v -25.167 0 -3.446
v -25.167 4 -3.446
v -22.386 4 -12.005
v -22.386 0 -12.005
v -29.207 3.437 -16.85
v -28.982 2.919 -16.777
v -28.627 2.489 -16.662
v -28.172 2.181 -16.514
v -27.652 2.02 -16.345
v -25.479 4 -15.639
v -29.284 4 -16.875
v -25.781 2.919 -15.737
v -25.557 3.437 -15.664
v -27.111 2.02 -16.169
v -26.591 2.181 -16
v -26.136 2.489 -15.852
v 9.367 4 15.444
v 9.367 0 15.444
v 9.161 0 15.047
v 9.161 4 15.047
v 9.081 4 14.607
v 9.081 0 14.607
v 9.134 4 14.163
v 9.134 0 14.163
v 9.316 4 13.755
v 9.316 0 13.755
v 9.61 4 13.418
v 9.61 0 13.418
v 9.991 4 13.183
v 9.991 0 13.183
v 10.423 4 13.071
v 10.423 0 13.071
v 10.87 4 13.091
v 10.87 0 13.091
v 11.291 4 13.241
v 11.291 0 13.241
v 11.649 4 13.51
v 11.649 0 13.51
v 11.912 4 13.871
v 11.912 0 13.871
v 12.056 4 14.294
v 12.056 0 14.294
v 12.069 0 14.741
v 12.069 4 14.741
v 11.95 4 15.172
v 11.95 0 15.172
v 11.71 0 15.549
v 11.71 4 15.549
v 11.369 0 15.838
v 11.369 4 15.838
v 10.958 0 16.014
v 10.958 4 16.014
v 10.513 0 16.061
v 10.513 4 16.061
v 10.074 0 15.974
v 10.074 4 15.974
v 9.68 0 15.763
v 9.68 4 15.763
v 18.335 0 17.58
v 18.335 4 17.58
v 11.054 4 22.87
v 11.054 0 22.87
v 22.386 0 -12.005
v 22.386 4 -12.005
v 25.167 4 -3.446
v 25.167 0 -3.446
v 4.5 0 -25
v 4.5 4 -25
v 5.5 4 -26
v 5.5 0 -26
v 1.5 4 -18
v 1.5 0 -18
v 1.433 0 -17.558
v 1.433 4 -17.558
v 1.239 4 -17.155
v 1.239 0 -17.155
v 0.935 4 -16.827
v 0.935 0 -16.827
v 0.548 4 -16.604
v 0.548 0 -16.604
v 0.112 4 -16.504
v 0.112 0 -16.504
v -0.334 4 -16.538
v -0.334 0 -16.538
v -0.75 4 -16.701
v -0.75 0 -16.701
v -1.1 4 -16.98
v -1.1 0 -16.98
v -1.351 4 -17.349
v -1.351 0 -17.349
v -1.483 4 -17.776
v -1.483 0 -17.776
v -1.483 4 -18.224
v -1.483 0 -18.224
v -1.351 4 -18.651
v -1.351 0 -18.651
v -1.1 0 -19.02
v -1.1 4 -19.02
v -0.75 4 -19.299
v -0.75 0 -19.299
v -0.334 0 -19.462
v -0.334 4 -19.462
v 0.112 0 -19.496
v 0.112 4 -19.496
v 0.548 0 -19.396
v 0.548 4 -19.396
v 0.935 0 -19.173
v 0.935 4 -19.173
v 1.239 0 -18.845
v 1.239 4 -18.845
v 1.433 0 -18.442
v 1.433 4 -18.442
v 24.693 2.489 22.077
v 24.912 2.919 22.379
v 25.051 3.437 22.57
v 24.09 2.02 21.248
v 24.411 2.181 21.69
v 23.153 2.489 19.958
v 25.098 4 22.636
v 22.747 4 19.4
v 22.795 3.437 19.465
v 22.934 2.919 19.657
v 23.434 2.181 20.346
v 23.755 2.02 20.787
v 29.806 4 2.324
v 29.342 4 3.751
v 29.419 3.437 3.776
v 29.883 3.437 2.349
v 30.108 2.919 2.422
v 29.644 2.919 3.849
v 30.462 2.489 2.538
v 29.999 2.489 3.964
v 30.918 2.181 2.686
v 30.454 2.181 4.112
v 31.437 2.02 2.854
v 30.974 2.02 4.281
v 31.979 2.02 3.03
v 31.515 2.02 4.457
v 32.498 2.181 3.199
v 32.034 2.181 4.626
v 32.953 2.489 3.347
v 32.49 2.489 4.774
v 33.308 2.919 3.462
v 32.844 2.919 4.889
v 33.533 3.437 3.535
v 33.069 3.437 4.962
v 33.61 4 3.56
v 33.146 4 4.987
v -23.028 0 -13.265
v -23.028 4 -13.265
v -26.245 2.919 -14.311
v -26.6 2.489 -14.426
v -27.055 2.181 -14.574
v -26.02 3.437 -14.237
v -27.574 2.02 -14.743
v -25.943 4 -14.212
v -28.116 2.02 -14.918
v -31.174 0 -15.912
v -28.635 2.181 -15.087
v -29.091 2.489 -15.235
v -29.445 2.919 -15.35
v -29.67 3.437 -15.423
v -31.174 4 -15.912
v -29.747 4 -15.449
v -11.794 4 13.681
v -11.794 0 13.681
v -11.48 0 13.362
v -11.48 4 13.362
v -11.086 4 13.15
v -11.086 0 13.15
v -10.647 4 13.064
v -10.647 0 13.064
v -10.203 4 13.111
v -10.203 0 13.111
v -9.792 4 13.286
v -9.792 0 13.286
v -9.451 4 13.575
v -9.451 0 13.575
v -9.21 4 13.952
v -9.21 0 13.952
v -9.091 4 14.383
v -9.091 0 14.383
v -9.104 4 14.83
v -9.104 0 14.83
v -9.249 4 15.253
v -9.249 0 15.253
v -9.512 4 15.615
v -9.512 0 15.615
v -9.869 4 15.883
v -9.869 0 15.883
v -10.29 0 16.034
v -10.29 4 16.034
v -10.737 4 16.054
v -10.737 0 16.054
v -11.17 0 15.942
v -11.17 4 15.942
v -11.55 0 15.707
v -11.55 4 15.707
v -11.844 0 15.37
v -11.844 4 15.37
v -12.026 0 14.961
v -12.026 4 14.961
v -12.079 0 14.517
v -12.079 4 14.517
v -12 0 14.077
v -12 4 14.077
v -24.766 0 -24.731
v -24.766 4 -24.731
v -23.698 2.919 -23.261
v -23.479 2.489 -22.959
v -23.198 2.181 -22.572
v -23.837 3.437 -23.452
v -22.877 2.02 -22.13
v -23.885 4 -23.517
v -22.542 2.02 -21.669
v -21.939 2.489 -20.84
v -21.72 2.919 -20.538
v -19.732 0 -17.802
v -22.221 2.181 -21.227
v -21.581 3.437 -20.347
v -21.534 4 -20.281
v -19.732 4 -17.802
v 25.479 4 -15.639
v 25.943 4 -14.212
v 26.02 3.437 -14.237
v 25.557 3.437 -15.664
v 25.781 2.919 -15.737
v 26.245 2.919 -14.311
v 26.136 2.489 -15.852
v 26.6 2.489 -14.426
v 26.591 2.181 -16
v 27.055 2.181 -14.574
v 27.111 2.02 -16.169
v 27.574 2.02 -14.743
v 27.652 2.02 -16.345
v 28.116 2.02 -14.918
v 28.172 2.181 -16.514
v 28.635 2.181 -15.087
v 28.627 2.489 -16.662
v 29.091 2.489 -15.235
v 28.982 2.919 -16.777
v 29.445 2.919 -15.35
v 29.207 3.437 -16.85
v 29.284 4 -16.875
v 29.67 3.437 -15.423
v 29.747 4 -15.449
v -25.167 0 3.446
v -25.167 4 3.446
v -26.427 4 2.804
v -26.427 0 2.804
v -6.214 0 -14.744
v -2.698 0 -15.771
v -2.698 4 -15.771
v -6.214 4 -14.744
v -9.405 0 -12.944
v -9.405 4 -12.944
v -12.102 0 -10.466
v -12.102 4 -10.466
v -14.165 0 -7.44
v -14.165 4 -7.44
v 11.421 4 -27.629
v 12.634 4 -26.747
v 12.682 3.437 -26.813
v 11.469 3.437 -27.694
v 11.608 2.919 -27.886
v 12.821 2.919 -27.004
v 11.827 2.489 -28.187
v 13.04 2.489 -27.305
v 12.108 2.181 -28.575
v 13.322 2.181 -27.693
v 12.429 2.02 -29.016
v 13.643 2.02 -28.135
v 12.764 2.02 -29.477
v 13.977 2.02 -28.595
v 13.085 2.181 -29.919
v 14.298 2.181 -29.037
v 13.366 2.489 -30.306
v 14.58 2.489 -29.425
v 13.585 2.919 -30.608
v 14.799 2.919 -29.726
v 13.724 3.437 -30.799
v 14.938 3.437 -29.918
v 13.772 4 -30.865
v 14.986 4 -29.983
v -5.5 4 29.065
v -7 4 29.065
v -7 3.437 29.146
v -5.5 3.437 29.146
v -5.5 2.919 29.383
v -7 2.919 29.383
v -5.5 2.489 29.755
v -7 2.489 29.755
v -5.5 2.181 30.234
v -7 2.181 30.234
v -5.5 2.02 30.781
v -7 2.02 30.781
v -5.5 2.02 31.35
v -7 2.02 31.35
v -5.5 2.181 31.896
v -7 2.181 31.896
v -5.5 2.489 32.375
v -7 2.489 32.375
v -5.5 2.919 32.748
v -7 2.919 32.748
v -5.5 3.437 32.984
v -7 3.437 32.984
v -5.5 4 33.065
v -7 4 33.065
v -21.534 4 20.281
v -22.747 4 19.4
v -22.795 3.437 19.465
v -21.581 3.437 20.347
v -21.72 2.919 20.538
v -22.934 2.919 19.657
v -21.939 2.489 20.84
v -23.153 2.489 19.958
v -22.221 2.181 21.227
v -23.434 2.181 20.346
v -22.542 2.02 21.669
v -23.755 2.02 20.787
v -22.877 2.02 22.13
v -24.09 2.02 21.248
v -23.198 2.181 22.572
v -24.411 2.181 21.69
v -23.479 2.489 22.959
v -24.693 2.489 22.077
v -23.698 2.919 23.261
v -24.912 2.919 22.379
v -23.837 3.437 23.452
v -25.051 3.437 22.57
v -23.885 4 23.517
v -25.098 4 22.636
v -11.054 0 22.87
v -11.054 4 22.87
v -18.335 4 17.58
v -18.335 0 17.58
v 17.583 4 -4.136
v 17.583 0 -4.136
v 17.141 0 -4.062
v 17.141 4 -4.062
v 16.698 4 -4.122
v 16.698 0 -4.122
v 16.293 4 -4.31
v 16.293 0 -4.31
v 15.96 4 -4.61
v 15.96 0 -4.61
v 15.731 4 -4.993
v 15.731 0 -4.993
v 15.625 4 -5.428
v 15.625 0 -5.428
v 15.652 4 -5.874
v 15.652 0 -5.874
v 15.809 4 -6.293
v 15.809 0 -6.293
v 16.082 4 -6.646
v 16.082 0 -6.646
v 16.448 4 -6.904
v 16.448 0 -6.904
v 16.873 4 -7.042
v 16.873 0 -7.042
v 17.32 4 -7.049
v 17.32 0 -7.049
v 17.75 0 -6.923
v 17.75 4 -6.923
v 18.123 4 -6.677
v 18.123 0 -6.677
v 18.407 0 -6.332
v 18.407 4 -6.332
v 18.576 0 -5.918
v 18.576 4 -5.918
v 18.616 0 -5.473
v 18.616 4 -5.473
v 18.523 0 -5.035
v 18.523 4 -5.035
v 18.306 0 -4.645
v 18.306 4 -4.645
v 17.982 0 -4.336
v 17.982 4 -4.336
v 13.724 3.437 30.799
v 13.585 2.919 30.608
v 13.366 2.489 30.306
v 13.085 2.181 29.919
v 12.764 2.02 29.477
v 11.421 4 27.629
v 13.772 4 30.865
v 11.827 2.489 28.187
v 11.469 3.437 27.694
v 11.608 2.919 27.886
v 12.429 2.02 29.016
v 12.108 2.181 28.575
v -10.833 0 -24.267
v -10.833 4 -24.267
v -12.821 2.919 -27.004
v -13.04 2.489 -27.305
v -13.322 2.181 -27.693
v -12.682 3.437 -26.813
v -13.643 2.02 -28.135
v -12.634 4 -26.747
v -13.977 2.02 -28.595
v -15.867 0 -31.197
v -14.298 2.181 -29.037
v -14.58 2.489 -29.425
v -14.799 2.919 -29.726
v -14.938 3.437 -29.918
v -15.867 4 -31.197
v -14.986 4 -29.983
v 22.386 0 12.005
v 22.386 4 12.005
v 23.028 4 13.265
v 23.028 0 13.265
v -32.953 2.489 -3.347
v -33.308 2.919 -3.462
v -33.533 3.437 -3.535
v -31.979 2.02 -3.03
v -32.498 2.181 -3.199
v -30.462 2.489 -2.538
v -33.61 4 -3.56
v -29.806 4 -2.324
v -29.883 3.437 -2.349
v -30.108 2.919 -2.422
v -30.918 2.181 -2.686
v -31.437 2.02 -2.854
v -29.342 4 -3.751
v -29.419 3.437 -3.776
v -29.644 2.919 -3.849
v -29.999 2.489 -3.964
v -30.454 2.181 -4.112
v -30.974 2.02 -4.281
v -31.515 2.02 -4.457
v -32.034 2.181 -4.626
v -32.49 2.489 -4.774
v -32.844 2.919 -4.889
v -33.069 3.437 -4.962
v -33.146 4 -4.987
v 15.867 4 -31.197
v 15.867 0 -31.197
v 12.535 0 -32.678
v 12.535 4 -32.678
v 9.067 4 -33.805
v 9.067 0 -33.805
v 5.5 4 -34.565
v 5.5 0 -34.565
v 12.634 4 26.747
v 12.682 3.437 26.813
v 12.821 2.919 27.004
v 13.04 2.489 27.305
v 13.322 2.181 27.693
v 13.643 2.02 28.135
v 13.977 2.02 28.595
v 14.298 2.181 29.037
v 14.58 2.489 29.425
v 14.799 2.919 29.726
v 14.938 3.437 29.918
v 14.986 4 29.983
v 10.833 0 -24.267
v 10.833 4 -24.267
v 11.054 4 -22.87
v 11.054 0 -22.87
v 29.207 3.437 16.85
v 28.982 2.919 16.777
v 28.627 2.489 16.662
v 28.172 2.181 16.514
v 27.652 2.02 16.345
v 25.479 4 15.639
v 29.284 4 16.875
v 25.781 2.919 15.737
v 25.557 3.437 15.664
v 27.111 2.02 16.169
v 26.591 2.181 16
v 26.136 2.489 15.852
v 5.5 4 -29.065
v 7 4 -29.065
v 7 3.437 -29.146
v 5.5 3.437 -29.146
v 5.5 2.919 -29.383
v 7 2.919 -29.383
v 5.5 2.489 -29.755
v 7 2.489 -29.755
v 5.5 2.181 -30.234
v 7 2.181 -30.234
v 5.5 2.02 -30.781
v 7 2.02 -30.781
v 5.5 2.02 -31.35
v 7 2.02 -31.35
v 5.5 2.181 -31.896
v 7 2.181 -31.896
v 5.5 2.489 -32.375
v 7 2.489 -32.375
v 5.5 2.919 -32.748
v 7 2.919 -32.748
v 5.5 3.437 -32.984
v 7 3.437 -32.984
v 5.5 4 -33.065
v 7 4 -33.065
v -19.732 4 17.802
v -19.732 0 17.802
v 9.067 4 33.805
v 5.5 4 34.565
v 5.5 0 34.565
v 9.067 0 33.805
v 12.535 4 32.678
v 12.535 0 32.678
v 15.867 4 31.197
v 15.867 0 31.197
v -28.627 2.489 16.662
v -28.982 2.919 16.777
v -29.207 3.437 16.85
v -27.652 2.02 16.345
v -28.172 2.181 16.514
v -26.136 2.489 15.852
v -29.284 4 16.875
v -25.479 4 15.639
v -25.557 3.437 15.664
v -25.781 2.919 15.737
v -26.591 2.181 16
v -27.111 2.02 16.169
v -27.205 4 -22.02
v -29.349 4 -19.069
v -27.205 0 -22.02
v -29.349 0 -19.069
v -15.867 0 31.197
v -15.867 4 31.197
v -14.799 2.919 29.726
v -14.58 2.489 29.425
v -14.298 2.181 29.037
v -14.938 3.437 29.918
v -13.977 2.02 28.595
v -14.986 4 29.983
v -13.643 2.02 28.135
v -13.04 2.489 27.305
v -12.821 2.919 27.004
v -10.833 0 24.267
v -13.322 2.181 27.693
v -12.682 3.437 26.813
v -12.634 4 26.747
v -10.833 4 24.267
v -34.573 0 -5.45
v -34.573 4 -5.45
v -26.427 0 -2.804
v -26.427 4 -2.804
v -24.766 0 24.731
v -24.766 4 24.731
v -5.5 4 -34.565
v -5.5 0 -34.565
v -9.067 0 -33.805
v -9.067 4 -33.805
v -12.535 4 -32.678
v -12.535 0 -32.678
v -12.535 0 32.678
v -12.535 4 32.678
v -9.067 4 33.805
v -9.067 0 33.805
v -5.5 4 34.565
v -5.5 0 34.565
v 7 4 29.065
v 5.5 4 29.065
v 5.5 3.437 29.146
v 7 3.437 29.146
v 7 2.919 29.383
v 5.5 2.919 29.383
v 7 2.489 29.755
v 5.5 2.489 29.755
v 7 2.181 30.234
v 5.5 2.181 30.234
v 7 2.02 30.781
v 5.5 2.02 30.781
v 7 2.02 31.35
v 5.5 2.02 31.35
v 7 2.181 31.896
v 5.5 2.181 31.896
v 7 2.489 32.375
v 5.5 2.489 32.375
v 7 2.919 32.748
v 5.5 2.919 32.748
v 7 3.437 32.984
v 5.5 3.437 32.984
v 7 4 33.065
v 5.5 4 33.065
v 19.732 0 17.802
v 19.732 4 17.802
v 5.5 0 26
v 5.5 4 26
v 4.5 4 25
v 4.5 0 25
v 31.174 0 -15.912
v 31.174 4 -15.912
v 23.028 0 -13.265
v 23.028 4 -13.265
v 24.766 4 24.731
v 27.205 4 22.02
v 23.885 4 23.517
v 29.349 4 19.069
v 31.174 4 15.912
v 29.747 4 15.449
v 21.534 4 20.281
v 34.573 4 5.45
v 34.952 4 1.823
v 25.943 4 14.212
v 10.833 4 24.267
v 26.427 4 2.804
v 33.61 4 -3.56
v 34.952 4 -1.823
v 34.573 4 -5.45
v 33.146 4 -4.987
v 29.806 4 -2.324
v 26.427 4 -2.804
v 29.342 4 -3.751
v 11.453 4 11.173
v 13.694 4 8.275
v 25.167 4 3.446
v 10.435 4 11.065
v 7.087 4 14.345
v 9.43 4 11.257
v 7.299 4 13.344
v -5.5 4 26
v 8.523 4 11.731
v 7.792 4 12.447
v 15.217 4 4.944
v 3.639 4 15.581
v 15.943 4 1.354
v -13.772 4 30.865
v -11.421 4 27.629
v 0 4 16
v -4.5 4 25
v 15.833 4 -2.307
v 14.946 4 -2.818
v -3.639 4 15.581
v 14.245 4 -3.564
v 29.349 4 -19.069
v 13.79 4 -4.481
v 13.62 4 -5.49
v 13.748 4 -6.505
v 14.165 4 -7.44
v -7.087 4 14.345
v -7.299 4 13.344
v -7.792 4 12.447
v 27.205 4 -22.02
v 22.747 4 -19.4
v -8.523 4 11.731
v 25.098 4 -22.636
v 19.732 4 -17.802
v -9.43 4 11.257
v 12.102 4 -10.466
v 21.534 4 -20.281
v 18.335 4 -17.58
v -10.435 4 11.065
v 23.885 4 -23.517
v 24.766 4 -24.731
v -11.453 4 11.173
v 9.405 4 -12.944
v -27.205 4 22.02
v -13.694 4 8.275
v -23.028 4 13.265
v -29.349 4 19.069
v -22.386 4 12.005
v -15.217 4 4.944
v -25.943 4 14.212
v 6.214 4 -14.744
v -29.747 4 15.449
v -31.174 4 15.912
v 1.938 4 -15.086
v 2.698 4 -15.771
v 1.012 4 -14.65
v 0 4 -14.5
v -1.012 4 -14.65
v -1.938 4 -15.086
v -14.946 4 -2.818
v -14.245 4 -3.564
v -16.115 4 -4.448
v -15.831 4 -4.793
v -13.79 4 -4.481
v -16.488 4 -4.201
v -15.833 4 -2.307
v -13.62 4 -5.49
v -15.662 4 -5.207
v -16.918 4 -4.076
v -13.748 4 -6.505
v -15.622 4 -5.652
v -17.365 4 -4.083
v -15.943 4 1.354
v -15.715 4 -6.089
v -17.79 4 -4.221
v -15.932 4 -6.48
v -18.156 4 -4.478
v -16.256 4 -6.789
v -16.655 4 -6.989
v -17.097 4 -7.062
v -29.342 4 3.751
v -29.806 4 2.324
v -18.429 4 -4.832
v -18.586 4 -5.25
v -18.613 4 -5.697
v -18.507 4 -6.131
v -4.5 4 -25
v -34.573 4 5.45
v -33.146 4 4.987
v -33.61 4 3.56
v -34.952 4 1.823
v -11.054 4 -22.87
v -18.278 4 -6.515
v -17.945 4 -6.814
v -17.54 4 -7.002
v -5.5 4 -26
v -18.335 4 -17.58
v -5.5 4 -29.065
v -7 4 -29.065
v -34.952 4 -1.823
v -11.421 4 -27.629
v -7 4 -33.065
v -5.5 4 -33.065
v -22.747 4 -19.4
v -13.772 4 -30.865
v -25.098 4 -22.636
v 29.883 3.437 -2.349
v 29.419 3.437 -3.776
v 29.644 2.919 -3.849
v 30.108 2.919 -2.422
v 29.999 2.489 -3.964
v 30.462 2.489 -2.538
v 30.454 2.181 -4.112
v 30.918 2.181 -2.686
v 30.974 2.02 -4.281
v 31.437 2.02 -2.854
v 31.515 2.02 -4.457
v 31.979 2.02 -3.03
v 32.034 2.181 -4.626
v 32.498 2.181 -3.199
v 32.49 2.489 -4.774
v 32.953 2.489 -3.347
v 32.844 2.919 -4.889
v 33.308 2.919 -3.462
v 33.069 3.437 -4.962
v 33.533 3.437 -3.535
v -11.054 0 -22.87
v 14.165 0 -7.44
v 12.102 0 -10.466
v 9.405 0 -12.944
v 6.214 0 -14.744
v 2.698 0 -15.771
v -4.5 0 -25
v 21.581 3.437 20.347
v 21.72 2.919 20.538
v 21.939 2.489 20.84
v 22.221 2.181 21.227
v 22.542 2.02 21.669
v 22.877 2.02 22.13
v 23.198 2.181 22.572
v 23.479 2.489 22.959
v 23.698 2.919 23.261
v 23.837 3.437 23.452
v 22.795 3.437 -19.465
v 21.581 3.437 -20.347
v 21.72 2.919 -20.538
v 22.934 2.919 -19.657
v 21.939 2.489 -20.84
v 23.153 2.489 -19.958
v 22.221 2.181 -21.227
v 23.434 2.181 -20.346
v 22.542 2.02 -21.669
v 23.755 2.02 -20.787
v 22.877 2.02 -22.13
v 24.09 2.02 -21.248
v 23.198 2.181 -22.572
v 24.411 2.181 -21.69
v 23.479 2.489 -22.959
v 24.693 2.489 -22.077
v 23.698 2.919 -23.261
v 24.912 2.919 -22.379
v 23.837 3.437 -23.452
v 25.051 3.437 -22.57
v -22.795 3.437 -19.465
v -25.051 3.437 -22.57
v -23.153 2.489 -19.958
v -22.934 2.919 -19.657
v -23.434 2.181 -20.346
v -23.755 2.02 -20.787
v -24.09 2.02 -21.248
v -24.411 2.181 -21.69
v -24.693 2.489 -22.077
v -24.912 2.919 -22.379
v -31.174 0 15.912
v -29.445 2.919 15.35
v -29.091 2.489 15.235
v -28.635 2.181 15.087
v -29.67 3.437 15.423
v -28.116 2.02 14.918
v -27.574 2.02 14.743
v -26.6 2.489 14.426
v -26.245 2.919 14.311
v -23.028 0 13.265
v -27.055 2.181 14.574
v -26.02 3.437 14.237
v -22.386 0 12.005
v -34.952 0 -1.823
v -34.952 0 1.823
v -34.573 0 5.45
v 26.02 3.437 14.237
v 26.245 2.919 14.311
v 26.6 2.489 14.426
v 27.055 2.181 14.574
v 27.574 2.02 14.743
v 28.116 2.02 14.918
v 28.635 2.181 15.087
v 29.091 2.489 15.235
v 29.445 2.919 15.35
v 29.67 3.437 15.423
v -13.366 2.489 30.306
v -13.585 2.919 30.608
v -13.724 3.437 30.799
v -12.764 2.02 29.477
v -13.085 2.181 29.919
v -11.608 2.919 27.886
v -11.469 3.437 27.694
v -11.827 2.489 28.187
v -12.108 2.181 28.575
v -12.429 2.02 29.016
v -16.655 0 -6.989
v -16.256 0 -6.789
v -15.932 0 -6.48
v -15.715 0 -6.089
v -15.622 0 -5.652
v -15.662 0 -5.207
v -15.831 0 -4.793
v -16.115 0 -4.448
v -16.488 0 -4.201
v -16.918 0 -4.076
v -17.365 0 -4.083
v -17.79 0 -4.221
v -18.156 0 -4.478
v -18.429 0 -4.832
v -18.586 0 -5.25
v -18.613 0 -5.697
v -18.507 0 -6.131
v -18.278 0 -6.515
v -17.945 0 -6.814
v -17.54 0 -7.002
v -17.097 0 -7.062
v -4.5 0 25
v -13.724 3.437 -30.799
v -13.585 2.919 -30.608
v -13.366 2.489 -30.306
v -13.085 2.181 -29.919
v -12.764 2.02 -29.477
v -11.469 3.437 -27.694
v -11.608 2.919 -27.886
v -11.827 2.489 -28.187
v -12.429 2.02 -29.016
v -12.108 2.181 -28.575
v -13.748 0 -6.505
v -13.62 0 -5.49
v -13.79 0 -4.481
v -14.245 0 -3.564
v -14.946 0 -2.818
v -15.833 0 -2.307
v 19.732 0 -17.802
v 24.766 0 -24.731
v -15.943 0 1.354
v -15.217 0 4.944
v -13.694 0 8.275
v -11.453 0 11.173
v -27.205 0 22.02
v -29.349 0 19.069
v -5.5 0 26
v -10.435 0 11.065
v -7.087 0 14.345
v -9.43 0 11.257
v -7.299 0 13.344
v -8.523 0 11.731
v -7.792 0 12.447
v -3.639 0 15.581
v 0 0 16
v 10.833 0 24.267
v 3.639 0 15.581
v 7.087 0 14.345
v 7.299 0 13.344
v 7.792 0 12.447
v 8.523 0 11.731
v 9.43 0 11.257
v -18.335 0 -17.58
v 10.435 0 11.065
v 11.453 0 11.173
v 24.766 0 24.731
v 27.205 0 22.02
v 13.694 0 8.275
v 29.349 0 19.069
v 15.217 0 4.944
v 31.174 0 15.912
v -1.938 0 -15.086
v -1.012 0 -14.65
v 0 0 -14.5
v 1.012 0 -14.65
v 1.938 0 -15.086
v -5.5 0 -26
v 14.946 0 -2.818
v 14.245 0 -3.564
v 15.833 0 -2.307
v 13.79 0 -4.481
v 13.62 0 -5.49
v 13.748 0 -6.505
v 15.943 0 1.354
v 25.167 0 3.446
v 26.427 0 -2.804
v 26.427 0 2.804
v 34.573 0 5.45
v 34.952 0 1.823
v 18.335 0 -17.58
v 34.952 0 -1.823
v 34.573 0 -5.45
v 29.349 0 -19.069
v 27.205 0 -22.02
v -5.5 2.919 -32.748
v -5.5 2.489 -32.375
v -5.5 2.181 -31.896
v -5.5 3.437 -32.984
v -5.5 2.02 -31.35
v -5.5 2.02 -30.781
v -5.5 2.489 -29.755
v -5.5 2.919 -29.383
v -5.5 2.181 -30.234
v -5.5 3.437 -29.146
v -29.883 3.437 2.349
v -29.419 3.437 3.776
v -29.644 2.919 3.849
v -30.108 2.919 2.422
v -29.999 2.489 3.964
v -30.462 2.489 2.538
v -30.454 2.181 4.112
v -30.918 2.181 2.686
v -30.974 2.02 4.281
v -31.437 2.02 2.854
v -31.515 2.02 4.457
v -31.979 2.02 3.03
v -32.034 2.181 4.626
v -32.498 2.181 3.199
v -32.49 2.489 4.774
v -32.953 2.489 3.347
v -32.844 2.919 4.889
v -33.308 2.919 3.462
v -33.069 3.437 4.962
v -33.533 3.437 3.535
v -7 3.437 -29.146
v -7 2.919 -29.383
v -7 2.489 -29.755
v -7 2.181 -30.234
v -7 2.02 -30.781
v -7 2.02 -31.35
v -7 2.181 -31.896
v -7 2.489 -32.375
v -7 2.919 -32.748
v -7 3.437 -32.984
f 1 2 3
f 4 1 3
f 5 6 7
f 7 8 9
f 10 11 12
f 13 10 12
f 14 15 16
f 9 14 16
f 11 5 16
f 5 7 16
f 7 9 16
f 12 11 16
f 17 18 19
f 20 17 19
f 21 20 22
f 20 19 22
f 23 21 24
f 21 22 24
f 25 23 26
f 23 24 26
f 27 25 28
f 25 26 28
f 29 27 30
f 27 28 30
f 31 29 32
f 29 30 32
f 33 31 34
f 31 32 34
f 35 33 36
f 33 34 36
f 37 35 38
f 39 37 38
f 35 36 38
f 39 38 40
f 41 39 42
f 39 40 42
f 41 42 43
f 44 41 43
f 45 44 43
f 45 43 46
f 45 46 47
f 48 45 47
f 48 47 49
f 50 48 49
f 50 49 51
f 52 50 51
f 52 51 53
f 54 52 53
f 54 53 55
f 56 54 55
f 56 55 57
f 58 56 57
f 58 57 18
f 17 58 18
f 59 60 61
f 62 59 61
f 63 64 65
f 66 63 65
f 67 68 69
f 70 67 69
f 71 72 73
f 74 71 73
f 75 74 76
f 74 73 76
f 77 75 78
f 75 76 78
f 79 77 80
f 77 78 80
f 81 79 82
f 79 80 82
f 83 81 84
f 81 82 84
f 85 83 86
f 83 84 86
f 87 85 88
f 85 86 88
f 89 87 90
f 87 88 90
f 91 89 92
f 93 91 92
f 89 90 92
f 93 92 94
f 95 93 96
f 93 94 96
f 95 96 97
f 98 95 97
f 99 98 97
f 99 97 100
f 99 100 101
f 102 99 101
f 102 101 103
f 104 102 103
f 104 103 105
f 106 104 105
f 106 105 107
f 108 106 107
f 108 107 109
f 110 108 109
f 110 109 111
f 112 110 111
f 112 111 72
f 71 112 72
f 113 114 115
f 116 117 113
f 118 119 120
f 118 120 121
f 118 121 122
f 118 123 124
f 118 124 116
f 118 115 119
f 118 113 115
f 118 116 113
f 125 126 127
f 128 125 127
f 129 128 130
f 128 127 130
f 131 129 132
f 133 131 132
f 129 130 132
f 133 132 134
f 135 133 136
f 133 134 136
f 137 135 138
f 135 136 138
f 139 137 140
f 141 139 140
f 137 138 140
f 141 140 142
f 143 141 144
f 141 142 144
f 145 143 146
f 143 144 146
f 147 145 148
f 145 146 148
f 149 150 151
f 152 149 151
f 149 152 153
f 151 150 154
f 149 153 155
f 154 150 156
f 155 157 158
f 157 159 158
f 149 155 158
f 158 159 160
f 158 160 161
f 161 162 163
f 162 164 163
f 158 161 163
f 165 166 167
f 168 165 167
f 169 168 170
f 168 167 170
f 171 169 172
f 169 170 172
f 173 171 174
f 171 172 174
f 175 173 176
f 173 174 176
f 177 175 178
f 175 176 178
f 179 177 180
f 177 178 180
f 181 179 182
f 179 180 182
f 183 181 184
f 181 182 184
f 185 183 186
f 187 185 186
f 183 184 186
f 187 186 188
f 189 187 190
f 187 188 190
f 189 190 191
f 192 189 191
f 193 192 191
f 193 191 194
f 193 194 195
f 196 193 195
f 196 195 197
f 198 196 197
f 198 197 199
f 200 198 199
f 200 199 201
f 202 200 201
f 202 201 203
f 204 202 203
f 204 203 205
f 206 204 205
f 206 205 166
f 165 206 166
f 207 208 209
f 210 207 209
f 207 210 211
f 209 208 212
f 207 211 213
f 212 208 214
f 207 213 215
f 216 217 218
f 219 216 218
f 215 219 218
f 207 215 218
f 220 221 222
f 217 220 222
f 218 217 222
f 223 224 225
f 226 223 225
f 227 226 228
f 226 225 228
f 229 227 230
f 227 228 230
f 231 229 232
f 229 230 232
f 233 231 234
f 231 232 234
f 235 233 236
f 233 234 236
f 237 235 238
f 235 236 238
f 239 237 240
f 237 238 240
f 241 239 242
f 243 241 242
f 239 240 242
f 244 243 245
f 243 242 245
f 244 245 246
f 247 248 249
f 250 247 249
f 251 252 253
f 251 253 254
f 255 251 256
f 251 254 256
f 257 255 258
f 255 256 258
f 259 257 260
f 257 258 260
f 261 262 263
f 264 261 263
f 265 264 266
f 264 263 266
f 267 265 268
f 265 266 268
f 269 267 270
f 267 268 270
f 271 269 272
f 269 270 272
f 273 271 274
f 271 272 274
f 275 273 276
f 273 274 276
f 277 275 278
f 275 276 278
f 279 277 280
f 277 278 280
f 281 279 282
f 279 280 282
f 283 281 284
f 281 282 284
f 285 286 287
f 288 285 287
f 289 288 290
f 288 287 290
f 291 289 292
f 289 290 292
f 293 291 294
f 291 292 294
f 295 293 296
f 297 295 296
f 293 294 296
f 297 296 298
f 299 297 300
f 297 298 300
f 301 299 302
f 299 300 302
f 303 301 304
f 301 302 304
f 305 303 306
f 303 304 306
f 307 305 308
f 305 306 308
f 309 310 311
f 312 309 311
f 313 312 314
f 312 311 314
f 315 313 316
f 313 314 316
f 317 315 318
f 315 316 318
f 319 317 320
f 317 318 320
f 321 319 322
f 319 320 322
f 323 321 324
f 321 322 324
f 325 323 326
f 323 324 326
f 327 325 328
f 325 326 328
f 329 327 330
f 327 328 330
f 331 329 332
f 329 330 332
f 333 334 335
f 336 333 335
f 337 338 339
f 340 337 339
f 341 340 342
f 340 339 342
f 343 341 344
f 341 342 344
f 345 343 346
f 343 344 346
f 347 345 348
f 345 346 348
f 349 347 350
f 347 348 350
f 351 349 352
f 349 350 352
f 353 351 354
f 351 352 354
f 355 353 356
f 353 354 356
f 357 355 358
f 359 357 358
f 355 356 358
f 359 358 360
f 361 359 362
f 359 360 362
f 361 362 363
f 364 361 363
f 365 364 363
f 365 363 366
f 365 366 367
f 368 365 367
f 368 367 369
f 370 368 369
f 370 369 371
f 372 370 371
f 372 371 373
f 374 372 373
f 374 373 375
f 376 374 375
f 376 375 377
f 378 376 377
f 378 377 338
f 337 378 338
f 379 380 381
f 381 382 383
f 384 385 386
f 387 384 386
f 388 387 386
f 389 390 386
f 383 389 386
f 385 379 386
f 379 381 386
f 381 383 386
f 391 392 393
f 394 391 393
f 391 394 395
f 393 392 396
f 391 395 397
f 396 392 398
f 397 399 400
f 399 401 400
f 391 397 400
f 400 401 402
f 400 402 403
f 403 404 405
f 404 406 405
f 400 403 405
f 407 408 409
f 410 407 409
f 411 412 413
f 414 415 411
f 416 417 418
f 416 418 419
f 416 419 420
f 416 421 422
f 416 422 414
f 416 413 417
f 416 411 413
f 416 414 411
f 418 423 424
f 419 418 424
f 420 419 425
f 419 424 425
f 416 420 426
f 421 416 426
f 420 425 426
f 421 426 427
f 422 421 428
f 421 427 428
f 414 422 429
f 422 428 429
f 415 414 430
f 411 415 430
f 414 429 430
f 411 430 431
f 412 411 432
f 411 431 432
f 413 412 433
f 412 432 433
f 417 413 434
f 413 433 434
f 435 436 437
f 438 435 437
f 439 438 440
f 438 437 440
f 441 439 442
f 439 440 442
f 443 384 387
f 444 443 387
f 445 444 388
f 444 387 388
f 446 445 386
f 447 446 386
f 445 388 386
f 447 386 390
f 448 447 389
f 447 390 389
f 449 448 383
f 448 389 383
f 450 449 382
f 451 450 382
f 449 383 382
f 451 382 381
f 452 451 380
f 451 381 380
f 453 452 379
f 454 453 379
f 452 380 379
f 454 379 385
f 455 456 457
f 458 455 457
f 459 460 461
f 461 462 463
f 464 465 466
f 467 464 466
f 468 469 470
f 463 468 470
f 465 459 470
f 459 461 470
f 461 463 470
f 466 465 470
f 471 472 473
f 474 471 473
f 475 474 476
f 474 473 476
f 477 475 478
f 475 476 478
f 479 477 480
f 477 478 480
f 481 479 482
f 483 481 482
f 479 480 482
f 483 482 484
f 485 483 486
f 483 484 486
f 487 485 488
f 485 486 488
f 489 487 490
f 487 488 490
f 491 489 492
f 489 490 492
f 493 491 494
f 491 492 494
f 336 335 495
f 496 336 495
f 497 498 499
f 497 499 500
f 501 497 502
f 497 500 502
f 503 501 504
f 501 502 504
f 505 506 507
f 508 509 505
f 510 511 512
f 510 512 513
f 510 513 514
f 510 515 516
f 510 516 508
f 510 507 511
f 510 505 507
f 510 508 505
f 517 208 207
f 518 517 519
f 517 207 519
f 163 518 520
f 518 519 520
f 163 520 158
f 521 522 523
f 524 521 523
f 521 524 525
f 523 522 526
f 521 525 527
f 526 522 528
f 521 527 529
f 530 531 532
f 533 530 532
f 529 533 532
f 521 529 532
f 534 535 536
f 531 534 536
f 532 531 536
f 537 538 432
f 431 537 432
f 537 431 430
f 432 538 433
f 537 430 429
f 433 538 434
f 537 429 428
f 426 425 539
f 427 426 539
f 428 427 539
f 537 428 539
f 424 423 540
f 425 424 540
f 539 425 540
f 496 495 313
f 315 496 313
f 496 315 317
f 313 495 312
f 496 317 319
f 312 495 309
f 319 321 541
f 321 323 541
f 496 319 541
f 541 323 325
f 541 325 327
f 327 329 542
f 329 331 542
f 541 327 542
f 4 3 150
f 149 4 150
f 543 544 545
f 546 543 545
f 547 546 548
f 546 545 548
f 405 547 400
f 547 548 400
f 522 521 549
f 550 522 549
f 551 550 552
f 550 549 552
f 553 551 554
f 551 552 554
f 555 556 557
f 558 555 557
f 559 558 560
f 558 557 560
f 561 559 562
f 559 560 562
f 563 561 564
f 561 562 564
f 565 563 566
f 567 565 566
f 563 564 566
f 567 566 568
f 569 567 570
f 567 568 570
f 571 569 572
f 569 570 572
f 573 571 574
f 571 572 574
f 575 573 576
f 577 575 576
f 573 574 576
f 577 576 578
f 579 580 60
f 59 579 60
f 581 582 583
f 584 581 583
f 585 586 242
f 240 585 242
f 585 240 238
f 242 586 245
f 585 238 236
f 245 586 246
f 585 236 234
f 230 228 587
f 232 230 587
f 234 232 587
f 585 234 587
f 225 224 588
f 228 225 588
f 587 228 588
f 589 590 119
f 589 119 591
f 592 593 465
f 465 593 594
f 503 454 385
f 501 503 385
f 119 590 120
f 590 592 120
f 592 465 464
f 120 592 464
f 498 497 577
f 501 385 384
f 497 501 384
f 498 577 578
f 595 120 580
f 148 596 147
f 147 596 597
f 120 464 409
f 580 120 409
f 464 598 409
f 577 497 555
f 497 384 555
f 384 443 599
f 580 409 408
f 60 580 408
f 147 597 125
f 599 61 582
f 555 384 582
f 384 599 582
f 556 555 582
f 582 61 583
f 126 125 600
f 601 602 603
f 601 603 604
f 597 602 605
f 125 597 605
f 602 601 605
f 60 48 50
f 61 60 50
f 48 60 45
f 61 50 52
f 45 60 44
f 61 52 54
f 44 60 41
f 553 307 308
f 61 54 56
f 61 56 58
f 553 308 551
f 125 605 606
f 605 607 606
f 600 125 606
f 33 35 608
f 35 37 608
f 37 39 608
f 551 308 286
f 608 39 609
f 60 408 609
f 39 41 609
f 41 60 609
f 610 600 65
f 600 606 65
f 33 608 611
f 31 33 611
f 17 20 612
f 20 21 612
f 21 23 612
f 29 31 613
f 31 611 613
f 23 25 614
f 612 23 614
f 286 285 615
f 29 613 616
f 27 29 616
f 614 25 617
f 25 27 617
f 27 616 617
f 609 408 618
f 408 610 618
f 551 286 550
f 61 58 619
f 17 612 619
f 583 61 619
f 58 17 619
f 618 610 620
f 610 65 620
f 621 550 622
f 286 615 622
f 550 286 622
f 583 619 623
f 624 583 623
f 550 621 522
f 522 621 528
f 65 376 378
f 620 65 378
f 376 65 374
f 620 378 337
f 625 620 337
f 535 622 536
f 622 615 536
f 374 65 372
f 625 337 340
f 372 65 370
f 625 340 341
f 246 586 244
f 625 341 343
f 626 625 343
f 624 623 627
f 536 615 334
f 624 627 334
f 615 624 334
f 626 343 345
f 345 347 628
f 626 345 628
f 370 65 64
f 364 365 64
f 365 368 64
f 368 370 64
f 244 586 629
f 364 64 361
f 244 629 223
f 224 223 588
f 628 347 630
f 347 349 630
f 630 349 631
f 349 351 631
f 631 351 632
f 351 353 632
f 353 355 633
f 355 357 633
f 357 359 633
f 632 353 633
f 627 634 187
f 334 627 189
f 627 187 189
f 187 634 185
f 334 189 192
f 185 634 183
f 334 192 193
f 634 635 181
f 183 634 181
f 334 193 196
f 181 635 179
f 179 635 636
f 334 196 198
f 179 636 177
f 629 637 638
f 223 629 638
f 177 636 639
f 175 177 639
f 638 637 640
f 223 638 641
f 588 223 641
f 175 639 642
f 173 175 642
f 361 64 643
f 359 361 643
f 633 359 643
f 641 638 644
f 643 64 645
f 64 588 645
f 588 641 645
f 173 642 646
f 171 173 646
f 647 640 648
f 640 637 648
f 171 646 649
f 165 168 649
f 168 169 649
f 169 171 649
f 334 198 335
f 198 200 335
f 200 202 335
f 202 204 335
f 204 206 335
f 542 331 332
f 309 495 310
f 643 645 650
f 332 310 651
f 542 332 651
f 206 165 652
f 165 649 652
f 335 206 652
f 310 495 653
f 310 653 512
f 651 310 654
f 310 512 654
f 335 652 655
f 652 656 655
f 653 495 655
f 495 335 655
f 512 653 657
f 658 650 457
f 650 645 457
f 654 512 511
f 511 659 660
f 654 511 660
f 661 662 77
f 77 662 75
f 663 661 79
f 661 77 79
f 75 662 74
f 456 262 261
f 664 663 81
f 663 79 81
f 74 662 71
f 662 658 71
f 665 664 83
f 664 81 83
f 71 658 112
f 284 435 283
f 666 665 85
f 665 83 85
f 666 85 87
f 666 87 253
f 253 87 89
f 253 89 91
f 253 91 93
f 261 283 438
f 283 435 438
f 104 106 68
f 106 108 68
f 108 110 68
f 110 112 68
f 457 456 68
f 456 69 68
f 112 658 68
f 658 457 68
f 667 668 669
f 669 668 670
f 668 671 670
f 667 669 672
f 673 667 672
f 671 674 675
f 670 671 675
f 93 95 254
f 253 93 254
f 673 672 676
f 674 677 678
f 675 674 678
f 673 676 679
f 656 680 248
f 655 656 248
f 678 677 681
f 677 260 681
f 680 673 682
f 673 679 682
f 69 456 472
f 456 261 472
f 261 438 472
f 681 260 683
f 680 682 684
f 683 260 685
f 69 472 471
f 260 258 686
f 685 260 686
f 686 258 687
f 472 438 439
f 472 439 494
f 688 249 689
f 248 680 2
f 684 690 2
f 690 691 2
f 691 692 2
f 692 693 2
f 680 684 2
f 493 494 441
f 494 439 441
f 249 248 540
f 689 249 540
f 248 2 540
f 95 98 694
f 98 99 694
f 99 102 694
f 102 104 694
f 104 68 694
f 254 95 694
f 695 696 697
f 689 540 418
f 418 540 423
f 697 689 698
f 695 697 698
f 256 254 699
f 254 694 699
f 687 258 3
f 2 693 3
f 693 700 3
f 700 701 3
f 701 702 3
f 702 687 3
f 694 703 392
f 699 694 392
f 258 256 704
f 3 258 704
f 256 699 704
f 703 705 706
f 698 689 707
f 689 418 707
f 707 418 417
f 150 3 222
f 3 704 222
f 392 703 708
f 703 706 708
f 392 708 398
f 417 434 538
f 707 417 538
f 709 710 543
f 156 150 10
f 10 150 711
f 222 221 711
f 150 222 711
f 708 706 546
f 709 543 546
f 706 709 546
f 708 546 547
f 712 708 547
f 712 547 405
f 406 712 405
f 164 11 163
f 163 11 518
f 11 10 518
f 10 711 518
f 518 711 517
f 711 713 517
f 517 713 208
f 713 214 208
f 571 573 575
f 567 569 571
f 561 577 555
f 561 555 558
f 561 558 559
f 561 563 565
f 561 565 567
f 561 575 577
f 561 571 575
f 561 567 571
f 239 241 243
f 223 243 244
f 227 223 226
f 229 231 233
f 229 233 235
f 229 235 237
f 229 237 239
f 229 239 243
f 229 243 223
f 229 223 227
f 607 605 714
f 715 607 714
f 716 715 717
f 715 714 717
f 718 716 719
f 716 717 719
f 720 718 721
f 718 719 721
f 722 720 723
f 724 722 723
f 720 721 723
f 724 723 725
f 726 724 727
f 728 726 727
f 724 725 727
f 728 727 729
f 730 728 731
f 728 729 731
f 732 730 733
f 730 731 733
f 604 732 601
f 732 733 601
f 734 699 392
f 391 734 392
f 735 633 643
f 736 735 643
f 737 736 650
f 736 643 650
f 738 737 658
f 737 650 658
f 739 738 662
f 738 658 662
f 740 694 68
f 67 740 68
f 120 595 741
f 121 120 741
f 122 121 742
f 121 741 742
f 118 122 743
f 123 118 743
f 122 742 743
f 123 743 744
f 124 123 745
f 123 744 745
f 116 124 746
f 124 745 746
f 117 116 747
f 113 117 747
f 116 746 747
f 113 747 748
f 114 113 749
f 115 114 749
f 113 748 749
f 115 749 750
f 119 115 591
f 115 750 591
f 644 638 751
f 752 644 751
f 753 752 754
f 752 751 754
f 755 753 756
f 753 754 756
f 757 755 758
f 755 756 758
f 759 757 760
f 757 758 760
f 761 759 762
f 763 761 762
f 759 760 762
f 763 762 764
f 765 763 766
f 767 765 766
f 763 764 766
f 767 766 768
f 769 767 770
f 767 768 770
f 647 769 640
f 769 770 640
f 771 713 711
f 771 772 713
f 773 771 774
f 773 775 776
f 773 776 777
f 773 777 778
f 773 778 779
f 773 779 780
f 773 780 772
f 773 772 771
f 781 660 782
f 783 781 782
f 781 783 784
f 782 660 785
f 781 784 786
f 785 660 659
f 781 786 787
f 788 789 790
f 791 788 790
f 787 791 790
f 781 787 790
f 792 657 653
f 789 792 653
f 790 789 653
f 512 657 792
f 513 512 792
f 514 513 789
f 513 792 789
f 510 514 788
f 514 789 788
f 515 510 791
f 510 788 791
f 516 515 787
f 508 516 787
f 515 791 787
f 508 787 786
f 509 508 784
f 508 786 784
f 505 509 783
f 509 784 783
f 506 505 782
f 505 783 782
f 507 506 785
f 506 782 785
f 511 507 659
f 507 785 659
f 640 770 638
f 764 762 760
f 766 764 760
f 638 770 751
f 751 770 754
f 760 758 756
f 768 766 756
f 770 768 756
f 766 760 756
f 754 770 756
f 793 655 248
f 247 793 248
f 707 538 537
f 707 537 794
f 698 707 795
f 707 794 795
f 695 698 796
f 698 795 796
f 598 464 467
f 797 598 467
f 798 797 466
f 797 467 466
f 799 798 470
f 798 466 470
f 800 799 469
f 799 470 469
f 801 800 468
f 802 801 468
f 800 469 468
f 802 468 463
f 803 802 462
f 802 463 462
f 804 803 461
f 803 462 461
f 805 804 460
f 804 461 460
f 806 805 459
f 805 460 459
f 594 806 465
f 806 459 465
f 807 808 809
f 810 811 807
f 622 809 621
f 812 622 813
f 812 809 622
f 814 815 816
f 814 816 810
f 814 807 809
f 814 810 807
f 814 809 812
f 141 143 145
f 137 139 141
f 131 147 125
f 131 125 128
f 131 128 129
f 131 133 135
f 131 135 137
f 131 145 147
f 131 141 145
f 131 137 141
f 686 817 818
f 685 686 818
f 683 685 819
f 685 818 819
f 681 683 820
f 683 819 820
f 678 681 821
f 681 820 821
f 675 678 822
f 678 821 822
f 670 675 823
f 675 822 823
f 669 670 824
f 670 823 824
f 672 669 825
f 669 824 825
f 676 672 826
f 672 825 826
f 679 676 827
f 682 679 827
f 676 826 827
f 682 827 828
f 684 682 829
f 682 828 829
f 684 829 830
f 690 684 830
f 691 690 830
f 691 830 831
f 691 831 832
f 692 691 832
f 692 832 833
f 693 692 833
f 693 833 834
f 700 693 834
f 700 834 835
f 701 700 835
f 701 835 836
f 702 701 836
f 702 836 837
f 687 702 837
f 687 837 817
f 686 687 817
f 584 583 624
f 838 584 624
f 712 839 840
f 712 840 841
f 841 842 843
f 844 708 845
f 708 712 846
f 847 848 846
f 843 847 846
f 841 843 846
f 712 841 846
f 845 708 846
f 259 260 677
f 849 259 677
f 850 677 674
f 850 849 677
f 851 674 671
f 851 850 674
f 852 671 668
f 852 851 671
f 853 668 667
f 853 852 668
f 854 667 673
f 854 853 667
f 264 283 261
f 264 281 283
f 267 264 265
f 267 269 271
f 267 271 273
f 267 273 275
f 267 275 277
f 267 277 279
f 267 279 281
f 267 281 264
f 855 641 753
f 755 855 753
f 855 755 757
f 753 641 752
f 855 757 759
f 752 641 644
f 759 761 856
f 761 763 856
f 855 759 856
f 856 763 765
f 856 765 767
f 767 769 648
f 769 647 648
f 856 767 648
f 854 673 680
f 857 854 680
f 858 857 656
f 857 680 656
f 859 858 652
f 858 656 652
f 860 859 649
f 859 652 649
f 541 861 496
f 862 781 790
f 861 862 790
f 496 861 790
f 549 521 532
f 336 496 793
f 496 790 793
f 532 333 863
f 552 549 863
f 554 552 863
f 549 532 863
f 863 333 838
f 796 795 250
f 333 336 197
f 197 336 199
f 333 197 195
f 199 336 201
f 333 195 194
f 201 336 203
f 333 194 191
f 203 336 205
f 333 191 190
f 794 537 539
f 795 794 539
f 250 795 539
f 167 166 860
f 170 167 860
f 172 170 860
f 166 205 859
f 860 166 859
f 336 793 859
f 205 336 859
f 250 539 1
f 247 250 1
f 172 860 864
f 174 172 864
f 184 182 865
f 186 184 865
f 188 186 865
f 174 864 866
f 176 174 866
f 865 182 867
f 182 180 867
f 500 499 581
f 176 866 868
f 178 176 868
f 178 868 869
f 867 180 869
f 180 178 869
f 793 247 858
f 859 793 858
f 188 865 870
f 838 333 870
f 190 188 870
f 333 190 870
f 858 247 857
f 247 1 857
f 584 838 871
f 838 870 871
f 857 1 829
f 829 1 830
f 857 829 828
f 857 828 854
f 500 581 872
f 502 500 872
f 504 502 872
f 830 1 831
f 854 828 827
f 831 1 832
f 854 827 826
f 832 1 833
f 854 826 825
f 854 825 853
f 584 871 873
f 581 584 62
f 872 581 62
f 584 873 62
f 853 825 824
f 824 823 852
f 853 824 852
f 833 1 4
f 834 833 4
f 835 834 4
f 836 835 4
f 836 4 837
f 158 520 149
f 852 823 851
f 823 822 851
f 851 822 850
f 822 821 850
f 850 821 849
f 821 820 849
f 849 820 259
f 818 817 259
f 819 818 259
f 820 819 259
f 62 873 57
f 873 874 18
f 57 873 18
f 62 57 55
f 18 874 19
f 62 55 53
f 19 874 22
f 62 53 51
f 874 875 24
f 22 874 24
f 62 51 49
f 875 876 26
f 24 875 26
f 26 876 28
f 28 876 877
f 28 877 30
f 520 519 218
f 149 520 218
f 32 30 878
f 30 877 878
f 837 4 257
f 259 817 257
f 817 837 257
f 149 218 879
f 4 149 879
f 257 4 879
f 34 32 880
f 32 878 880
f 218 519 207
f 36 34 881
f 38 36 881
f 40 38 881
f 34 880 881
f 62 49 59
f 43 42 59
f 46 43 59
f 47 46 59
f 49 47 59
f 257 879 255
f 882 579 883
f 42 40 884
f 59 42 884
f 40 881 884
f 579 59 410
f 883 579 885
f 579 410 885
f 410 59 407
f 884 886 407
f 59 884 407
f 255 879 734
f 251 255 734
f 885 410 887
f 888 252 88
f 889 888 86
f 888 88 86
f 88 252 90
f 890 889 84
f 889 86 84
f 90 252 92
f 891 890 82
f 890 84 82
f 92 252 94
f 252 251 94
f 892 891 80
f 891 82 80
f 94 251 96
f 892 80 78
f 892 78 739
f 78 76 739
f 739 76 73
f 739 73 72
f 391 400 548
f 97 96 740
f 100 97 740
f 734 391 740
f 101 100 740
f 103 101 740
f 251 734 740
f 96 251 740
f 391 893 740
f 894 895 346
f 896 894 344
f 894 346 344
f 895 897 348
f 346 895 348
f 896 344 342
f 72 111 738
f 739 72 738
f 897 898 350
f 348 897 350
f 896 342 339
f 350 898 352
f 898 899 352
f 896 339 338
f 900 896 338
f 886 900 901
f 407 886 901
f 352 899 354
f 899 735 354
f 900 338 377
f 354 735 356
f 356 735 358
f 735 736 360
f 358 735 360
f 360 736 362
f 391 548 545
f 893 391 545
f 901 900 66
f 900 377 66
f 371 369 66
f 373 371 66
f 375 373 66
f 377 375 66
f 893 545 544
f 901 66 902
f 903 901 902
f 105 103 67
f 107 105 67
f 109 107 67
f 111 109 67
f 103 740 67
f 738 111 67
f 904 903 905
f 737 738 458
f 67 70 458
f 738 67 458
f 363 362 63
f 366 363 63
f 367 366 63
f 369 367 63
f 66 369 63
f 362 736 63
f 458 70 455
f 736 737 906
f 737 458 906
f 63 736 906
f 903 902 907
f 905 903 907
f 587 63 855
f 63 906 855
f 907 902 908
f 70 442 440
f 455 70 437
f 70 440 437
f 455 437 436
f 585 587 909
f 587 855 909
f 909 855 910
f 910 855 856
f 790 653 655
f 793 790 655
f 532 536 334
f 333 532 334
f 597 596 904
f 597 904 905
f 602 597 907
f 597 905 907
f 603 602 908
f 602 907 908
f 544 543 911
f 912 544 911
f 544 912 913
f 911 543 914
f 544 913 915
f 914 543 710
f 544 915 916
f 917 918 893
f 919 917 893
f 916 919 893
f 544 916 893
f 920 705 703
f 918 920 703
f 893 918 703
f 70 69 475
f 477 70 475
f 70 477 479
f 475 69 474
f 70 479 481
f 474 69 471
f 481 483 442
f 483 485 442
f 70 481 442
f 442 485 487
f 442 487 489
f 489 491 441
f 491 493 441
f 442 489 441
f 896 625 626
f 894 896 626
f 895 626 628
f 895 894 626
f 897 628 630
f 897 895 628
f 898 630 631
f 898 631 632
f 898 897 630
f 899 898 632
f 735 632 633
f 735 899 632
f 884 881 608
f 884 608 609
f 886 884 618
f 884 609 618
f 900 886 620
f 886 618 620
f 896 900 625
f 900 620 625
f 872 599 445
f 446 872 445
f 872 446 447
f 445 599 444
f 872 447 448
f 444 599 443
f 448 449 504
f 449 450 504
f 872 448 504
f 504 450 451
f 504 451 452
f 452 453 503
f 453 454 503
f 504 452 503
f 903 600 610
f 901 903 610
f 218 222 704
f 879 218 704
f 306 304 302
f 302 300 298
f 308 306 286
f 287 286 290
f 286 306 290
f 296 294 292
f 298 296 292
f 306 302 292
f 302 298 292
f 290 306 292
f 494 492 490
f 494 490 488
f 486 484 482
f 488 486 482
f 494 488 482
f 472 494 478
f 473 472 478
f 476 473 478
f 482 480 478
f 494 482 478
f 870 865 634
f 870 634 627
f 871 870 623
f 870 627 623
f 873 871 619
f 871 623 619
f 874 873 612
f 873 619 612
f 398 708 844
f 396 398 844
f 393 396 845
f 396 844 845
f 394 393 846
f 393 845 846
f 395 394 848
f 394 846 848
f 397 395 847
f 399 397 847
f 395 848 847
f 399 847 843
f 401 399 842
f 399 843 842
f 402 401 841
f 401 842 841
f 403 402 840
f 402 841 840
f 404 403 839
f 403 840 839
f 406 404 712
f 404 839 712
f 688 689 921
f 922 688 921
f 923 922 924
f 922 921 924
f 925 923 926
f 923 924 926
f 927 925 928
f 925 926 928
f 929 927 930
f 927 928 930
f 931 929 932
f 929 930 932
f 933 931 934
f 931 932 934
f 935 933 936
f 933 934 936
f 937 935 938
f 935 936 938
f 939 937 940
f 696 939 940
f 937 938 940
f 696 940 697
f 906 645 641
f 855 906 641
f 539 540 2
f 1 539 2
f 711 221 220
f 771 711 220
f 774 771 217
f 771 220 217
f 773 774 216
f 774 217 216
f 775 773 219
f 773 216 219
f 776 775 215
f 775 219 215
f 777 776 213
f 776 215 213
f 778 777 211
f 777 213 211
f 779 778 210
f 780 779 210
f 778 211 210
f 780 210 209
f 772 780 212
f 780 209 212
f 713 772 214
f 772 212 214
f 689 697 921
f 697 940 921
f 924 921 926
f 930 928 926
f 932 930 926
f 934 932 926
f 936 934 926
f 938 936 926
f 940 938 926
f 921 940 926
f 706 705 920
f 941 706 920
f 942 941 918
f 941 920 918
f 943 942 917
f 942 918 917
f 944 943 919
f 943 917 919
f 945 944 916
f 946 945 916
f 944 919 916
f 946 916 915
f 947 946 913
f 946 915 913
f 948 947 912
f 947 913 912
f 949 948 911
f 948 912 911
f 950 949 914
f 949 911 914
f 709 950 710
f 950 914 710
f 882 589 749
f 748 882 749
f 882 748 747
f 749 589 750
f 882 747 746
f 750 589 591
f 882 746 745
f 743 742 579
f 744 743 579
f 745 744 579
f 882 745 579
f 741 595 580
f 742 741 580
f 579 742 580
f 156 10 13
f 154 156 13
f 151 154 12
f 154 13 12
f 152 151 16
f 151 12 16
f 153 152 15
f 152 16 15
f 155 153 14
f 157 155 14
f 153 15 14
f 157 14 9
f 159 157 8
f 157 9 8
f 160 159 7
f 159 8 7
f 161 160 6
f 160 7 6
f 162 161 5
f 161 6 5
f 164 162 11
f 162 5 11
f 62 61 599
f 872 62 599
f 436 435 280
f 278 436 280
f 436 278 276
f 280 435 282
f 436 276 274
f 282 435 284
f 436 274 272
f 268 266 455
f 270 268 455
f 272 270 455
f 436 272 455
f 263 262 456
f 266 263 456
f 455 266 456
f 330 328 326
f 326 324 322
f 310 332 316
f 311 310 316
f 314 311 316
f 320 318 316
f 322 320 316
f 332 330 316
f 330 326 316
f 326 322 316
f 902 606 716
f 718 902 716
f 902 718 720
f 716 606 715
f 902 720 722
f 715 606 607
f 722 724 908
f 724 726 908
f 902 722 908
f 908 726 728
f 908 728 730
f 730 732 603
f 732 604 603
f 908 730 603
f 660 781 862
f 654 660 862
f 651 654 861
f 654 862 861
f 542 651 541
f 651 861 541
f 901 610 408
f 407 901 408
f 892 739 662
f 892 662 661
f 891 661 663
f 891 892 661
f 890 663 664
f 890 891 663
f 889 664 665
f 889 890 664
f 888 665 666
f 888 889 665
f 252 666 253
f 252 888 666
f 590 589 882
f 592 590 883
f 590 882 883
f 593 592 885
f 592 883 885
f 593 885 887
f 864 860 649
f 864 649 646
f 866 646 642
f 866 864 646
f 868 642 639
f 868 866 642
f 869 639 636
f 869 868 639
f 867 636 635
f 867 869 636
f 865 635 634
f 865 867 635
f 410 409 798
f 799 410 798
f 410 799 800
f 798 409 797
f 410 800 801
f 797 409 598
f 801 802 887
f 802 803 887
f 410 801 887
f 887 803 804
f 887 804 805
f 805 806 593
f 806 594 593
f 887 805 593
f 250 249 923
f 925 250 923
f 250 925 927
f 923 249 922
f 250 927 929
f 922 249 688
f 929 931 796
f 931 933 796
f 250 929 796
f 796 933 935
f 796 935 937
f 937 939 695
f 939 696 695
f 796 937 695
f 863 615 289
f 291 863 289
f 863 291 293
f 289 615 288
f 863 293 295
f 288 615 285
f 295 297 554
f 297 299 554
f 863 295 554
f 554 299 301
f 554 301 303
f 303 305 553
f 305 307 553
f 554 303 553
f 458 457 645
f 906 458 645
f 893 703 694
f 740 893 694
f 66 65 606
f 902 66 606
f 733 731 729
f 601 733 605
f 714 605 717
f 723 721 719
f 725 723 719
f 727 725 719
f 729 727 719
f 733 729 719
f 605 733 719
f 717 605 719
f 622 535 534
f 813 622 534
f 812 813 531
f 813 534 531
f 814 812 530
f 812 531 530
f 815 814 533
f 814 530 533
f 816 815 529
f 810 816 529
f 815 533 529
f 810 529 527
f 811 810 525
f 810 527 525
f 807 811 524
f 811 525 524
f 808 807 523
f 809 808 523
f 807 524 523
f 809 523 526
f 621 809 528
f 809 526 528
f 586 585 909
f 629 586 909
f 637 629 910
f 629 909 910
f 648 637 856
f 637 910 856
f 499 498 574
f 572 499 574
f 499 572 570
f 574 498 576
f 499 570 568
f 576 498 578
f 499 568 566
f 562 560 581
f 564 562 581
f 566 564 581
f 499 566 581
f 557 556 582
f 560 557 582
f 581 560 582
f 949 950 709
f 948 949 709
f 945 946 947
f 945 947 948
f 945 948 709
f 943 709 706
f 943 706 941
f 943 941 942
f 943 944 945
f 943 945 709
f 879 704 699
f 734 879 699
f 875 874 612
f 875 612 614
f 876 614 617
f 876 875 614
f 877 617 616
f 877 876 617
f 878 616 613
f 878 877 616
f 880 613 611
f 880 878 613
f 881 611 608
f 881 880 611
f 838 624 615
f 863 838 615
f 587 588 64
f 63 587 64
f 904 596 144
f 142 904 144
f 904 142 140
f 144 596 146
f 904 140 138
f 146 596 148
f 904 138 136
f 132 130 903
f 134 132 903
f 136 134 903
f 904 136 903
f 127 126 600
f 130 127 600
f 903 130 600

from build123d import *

# Parameters (mm, degrees)
SKIZZE1_R                       = 35
AUFSATZ_LINEAR_AUSTRAGEN1_DEPTH = 4
SCHNITT_LINEAR_AUSTRAGEN1_DEPTH = 5
SKIZZE4_W                       = 14
SKIZZE4_H                       = 2
KREISMUSTER1_COUNT              = 10
SKIZZE5_R                       = 16
SCHNITT_LINEAR_AUSTRAGEN2_DEPTH = 5
SKIZZE7_R                       = 3.5
AUFSATZ_LINEAR_AUSTRAGEN2_DEPTH = 4
SKIZZE6_R                       = 1.5
SCHNITT_LINEAR_AUSTRAGEN3_DEPTH = 5
KREISMUSTER2_COUNT              = 5


with BuildPart() as part:
    # Skizze1 → Aufsatz-Linear austragen1 (new body)
    with BuildSketch(Plane(origin=(0, 0, 0), x_dir=(1, 0, 0), z_dir=(0, 1, 0))):
        Circle(SKIZZE1_R)
    extrude(amount=AUFSATZ_LINEAR_AUSTRAGEN1_DEPTH)

    # Skizze2 → Schnitt-Linear austragen1 (cut, through all)
    with BuildSketch(Plane(origin=(0, 4, 0), x_dir=(1, 0, 0), z_dir=(0, 1, 0))):
        Polygon((-5.5, 37), (-5.5, 26), (-4.5, 25), (0, 25), (4.5, 25), (5.5, 26), (5.5, 37), align=None)
    schnitt_linear_austragen1 = extrude(amount=-SCHNITT_LINEAR_AUSTRAGEN1_DEPTH, mode=Mode.SUBTRACT)

    # Skizze4 → Schnitt-Rotation1 (revolve, cut)
    with BuildSketch(Plane(origin=(0, 4, 0), x_dir=(1, 0, 0), z_dir=(0, 1, 0))):
        with Locations((0, 30.065155865)):
            Rectangle(SKIZZE4_W, SKIZZE4_H)
    schnitt_rotation1 = revolve(axis=Axis((-7, 4, -31.065155865), (1, 0, 0)), mode=Mode.SUBTRACT)

    # Kreismuster1: Schnitt-Linear austragen1, Schnitt-Rotation1 ×10 about axis
    kreismuster1_axis = Axis((0, 0, 0), (0, 1, 0))
    for i in range(1, KREISMUSTER1_COUNT):
        add(schnitt_linear_austragen1.rotate(kreismuster1_axis, i * 360 / KREISMUSTER1_COUNT), mode=Mode.SUBTRACT)
        add(schnitt_rotation1.rotate(kreismuster1_axis, i * 360 / KREISMUSTER1_COUNT), mode=Mode.SUBTRACT)

    # Skizze5 → Schnitt-Linear austragen2 (cut, through all)
    with BuildSketch(Plane(origin=(0, 4, 0), x_dir=(1, 0, 0), z_dir=(0, 1, 0))):
        Circle(SKIZZE5_R)
    extrude(amount=-SCHNITT_LINEAR_AUSTRAGEN2_DEPTH, mode=Mode.SUBTRACT)

    # Skizze7 → Aufsatz-Linear austragen2 (add)
    with BuildSketch(Plane(origin=(0, 0, 0), x_dir=(-1, 0, 0), z_dir=(0, -1, 0))):
        with Locations((0, 18)):
            Circle(SKIZZE7_R)
    aufsatz_linear_austragen2 = extrude(amount=-AUFSATZ_LINEAR_AUSTRAGEN2_DEPTH)

    # Skizze6 → Schnitt-Linear austragen3 (cut, through all)
    with BuildSketch(Plane.XZ):
        with Locations((0, -18)):
            Circle(SKIZZE6_R)
    schnitt_linear_austragen3 = extrude(amount=-SCHNITT_LINEAR_AUSTRAGEN3_DEPTH, mode=Mode.SUBTRACT)

    # Kreismuster2: Aufsatz-Linear austragen2, Schnitt-Linear austragen3 ×5 about axis
    kreismuster2_axis = Axis((0, 0, 0), (0, 1, 0))
    for i in range(1, KREISMUSTER2_COUNT):
        add(aufsatz_linear_austragen2.rotate(kreismuster2_axis, i * 360 / KREISMUSTER2_COUNT))
        add(schnitt_linear_austragen3.rotate(kreismuster2_axis, i * 360 / KREISMUSTER2_COUNT), mode=Mode.SUBTRACT)


solid = part.part
